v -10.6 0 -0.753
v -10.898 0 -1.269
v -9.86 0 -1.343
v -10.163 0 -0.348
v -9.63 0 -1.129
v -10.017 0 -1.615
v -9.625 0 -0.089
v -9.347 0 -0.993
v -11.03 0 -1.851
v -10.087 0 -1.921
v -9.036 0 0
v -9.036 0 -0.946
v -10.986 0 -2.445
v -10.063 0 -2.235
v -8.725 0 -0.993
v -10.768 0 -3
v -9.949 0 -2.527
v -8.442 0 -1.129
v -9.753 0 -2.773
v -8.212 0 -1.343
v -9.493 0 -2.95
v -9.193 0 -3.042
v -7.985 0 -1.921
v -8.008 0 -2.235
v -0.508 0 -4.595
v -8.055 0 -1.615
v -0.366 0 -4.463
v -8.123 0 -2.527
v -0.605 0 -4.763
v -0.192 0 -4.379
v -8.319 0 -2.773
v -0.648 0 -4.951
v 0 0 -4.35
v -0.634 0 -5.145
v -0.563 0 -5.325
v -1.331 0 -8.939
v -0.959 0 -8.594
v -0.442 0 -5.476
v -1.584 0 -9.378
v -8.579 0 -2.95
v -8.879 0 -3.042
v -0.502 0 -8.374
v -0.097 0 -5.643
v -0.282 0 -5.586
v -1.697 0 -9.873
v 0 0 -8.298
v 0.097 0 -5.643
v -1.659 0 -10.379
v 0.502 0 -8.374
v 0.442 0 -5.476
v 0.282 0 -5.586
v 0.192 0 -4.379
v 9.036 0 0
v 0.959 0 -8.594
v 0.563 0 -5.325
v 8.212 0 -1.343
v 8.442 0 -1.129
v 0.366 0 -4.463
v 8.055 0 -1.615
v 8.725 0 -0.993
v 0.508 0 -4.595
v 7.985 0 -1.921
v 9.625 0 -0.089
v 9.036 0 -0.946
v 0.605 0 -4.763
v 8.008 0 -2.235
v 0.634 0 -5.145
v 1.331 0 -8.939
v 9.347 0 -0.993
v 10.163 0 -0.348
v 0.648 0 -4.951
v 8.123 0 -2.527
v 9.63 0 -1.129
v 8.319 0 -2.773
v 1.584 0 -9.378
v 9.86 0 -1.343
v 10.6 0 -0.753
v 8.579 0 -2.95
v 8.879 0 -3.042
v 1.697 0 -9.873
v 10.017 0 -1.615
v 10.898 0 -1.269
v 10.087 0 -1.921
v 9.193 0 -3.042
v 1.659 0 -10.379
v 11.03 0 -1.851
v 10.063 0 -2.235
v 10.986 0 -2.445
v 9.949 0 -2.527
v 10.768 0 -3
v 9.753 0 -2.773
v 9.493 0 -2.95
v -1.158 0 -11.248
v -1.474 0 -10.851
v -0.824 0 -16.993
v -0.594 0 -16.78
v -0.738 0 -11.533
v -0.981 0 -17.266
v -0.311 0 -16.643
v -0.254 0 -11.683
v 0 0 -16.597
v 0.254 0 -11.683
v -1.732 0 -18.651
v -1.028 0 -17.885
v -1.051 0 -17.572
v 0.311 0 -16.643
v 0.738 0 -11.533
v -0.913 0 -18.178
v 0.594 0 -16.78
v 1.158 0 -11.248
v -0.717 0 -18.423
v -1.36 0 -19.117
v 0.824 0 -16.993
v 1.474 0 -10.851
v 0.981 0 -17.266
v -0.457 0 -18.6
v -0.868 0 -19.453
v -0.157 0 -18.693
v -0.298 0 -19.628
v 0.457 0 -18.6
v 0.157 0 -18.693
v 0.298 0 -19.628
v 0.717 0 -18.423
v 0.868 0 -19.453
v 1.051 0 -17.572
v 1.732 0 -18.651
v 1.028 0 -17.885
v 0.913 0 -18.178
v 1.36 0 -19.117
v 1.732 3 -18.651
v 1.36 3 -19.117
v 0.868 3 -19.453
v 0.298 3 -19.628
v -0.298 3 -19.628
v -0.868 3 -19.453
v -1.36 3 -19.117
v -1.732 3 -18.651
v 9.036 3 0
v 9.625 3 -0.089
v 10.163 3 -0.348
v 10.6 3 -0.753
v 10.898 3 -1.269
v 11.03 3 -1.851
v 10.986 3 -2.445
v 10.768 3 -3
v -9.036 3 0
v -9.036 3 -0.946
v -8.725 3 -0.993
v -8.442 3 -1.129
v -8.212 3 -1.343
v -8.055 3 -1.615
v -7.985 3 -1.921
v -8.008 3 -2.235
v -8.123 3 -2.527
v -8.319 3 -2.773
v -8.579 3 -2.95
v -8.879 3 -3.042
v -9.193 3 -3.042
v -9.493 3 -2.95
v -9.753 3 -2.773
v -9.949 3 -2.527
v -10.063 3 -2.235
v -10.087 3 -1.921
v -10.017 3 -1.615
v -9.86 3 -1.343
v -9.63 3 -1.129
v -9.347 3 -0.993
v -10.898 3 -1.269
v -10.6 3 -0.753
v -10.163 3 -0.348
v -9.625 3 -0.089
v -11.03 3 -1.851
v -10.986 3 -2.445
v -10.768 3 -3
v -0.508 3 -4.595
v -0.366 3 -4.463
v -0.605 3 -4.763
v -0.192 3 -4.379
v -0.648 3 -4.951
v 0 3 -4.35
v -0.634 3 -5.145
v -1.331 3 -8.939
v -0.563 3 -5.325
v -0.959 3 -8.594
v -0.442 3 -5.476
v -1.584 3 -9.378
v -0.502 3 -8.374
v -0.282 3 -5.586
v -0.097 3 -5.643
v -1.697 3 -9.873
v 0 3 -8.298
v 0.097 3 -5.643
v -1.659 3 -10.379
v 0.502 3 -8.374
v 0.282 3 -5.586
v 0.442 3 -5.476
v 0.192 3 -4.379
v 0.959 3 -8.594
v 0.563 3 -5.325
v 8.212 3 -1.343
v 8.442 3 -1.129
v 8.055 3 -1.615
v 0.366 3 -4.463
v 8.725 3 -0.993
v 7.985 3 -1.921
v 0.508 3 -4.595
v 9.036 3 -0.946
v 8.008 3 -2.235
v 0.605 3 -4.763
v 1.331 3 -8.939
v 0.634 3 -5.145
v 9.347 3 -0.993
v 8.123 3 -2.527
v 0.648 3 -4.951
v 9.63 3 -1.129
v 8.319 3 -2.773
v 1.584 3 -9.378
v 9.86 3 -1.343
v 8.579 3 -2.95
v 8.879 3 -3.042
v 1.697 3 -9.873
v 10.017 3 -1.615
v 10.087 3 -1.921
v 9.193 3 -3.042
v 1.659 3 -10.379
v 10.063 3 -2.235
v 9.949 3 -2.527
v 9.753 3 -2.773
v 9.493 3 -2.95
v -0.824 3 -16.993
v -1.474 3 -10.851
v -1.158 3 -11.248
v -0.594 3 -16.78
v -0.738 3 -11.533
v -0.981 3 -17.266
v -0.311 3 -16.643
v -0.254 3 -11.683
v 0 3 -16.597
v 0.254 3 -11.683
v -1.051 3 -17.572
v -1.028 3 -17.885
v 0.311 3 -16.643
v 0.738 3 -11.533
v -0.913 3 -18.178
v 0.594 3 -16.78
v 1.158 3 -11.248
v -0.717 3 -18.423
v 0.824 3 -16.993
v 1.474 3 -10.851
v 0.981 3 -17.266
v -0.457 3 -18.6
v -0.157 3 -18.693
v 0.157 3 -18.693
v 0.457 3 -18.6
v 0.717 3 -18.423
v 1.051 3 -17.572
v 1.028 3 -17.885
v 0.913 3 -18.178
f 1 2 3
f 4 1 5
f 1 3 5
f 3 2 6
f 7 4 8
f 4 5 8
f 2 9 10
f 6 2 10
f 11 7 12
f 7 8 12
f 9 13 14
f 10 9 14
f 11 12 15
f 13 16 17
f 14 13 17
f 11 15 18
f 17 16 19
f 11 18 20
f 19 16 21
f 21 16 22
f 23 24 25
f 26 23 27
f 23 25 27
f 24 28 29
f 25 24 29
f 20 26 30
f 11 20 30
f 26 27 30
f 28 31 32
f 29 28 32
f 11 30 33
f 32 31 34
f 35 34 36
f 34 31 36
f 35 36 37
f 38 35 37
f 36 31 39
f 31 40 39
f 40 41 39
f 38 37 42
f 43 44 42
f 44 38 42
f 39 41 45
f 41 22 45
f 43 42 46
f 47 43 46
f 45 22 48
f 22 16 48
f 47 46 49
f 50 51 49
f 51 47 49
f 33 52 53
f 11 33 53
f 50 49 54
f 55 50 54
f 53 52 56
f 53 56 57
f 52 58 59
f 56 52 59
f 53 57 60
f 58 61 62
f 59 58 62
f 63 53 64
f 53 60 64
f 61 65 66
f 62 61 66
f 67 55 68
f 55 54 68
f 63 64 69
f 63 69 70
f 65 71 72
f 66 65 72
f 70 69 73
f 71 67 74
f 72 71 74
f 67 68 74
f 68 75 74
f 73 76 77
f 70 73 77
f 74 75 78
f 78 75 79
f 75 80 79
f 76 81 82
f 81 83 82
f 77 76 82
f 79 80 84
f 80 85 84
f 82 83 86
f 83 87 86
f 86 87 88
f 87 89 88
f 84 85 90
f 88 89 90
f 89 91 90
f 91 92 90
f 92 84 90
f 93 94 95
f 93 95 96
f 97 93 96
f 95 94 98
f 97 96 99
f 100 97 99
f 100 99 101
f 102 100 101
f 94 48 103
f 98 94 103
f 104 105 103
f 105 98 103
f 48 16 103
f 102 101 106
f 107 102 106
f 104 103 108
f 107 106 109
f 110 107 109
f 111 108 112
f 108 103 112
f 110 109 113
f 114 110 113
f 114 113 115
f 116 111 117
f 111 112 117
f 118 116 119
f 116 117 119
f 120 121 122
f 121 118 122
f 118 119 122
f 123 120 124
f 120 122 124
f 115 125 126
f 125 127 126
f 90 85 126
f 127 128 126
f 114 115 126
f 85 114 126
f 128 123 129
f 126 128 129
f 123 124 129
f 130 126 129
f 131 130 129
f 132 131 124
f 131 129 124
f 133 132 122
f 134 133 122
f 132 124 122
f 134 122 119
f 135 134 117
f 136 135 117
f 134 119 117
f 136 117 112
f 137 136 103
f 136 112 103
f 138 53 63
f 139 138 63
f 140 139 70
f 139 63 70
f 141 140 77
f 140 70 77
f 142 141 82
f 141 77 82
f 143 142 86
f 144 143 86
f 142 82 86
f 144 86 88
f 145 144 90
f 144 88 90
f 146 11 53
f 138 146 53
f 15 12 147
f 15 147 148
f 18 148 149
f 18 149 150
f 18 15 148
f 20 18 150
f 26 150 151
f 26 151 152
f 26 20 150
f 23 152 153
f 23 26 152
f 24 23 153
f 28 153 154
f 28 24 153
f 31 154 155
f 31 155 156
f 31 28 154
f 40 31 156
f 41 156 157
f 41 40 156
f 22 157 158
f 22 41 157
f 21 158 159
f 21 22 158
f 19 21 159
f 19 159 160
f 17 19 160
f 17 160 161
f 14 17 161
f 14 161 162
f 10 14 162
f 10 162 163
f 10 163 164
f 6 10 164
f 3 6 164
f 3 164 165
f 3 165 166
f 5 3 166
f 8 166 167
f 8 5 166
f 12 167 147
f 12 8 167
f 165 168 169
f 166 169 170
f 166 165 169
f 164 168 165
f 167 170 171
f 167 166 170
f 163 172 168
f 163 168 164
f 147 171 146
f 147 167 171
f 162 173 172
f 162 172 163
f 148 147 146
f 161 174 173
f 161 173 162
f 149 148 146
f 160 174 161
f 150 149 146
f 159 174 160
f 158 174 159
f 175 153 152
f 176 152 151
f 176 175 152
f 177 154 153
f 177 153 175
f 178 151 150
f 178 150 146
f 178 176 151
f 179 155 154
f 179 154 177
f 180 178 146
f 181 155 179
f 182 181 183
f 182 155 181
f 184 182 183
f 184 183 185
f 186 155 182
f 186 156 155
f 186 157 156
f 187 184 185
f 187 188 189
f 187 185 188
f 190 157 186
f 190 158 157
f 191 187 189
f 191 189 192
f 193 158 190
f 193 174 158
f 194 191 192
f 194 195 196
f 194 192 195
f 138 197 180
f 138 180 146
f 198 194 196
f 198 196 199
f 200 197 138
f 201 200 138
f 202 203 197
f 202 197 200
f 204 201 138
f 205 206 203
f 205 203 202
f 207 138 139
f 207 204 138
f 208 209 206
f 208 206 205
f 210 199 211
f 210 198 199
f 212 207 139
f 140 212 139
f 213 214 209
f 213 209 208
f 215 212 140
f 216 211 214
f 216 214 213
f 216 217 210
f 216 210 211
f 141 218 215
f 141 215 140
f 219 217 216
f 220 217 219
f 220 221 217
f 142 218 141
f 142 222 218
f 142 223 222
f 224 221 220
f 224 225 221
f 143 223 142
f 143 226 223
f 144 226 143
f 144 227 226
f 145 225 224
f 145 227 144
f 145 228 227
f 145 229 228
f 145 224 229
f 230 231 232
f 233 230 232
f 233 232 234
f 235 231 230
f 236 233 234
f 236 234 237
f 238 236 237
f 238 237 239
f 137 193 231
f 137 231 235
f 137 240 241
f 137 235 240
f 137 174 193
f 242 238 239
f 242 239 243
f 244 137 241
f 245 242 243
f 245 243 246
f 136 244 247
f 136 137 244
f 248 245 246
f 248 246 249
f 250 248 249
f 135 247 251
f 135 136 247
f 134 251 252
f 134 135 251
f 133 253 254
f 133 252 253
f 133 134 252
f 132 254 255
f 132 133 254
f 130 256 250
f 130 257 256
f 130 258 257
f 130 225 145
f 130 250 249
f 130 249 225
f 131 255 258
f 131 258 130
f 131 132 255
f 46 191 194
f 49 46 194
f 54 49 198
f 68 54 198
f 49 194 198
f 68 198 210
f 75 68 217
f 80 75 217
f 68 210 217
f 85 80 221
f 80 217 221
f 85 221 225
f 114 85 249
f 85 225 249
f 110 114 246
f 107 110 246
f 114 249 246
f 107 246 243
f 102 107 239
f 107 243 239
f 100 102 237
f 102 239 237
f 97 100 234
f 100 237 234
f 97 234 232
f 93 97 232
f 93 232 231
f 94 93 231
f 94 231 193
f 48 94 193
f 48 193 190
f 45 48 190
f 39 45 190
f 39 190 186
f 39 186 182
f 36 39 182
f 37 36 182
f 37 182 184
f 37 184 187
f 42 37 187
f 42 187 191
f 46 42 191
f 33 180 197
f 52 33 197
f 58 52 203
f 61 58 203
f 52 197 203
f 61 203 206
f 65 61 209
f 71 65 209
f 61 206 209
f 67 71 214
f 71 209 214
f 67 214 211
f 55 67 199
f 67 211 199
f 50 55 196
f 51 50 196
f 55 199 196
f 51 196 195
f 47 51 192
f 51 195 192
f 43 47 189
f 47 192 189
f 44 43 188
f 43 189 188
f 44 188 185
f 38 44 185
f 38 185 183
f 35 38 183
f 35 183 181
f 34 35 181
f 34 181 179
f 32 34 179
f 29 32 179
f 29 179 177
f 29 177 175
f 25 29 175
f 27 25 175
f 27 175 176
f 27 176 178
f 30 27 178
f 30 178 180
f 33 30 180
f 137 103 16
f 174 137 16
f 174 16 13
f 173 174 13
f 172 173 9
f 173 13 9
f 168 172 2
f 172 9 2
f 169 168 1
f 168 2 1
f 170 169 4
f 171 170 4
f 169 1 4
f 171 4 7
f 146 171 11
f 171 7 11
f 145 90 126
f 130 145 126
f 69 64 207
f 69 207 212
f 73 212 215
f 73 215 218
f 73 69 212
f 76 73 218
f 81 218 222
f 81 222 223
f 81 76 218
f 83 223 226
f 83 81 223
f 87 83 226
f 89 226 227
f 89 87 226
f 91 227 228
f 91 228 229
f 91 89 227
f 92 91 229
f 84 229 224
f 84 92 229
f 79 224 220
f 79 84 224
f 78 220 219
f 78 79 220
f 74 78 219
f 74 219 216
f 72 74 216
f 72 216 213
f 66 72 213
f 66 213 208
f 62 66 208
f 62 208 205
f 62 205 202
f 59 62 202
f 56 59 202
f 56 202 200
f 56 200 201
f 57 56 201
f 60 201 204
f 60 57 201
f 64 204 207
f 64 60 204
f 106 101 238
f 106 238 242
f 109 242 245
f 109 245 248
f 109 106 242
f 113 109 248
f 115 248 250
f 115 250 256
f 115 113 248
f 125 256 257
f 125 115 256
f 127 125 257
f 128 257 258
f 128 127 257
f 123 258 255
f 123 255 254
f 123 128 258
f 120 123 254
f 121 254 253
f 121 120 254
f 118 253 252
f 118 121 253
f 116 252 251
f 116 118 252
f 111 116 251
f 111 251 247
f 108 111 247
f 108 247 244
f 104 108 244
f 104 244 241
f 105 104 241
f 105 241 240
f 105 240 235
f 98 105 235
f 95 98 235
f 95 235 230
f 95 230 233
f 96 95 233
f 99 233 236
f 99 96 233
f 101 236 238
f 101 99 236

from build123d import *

# Parameters (mm, degrees)
SKETCH1_R           = 1.054
BOSS_EXTRUDE1_DEPTH = 3
SKETCH2_R           = 1.702
SKETCH2_R_2         = 0.65
CUT_EXTRUDE1_DEPTH  = 23.736281859


with BuildPart() as part:
    # Sketch1 → Boss-Extrude1 (new body)
    with BuildSketch(Plane(origin=(0, 0, 0), x_dir=(1, 0, 0), z_dir=(0, 1, 0))):
        with BuildLine():
            Line((0, 0), (9.035898385, 0))
            ThreePointArc((9.035898385, 0), (10.767949192, 1), (10.767949192, 3))
            Line((10.767949192, 3), (1.732050808, 18.650635095))
            ThreePointArc((1.732050808, 18.650635095), (0, 19.650635095), (-1.732050808, 18.650635095))
            Line((-1.732050808, 18.650635095), (-10.767949192, 3))
            ThreePointArc((-10.767949192, 3), (-10.767949192, 1), (-9.035898385, 0))
            Line((-9.035898385, 0), (0, 0))
        make_face()
        with Locations(Location((0, 17.650635095, 0), (0, 0, 270))):
            Circle(SKETCH1_R, mode=Mode.SUBTRACT)
        with Locations(Location((-9.035898385, 2, 0), (0, 0, 270))):
            Circle(SKETCH1_R, mode=Mode.SUBTRACT)
        with Locations(Location((9.035898385, 2, 0), (0, 0, 270))):
            Circle(SKETCH1_R, mode=Mode.SUBTRACT)
    extrude(amount=BOSS_EXTRUDE1_DEPTH)

    # Sketch2 → Cut-Extrude1 (cut, through all)
    with BuildSketch(Plane(origin=(0, 3, 0), x_dir=(1, 0, 0), z_dir=(0, 1, 0))):
        with Locations(Location((0, 10, 0), (0, 0, 270))):
            Circle(SKETCH2_R)
        with Locations(Location((0, 5, 0), (0, 0, 270))):
            Circle(SKETCH2_R_2)
    extrude(amount=-CUT_EXTRUDE1_DEPTH, mode=Mode.SUBTRACT)


solid = part.part
